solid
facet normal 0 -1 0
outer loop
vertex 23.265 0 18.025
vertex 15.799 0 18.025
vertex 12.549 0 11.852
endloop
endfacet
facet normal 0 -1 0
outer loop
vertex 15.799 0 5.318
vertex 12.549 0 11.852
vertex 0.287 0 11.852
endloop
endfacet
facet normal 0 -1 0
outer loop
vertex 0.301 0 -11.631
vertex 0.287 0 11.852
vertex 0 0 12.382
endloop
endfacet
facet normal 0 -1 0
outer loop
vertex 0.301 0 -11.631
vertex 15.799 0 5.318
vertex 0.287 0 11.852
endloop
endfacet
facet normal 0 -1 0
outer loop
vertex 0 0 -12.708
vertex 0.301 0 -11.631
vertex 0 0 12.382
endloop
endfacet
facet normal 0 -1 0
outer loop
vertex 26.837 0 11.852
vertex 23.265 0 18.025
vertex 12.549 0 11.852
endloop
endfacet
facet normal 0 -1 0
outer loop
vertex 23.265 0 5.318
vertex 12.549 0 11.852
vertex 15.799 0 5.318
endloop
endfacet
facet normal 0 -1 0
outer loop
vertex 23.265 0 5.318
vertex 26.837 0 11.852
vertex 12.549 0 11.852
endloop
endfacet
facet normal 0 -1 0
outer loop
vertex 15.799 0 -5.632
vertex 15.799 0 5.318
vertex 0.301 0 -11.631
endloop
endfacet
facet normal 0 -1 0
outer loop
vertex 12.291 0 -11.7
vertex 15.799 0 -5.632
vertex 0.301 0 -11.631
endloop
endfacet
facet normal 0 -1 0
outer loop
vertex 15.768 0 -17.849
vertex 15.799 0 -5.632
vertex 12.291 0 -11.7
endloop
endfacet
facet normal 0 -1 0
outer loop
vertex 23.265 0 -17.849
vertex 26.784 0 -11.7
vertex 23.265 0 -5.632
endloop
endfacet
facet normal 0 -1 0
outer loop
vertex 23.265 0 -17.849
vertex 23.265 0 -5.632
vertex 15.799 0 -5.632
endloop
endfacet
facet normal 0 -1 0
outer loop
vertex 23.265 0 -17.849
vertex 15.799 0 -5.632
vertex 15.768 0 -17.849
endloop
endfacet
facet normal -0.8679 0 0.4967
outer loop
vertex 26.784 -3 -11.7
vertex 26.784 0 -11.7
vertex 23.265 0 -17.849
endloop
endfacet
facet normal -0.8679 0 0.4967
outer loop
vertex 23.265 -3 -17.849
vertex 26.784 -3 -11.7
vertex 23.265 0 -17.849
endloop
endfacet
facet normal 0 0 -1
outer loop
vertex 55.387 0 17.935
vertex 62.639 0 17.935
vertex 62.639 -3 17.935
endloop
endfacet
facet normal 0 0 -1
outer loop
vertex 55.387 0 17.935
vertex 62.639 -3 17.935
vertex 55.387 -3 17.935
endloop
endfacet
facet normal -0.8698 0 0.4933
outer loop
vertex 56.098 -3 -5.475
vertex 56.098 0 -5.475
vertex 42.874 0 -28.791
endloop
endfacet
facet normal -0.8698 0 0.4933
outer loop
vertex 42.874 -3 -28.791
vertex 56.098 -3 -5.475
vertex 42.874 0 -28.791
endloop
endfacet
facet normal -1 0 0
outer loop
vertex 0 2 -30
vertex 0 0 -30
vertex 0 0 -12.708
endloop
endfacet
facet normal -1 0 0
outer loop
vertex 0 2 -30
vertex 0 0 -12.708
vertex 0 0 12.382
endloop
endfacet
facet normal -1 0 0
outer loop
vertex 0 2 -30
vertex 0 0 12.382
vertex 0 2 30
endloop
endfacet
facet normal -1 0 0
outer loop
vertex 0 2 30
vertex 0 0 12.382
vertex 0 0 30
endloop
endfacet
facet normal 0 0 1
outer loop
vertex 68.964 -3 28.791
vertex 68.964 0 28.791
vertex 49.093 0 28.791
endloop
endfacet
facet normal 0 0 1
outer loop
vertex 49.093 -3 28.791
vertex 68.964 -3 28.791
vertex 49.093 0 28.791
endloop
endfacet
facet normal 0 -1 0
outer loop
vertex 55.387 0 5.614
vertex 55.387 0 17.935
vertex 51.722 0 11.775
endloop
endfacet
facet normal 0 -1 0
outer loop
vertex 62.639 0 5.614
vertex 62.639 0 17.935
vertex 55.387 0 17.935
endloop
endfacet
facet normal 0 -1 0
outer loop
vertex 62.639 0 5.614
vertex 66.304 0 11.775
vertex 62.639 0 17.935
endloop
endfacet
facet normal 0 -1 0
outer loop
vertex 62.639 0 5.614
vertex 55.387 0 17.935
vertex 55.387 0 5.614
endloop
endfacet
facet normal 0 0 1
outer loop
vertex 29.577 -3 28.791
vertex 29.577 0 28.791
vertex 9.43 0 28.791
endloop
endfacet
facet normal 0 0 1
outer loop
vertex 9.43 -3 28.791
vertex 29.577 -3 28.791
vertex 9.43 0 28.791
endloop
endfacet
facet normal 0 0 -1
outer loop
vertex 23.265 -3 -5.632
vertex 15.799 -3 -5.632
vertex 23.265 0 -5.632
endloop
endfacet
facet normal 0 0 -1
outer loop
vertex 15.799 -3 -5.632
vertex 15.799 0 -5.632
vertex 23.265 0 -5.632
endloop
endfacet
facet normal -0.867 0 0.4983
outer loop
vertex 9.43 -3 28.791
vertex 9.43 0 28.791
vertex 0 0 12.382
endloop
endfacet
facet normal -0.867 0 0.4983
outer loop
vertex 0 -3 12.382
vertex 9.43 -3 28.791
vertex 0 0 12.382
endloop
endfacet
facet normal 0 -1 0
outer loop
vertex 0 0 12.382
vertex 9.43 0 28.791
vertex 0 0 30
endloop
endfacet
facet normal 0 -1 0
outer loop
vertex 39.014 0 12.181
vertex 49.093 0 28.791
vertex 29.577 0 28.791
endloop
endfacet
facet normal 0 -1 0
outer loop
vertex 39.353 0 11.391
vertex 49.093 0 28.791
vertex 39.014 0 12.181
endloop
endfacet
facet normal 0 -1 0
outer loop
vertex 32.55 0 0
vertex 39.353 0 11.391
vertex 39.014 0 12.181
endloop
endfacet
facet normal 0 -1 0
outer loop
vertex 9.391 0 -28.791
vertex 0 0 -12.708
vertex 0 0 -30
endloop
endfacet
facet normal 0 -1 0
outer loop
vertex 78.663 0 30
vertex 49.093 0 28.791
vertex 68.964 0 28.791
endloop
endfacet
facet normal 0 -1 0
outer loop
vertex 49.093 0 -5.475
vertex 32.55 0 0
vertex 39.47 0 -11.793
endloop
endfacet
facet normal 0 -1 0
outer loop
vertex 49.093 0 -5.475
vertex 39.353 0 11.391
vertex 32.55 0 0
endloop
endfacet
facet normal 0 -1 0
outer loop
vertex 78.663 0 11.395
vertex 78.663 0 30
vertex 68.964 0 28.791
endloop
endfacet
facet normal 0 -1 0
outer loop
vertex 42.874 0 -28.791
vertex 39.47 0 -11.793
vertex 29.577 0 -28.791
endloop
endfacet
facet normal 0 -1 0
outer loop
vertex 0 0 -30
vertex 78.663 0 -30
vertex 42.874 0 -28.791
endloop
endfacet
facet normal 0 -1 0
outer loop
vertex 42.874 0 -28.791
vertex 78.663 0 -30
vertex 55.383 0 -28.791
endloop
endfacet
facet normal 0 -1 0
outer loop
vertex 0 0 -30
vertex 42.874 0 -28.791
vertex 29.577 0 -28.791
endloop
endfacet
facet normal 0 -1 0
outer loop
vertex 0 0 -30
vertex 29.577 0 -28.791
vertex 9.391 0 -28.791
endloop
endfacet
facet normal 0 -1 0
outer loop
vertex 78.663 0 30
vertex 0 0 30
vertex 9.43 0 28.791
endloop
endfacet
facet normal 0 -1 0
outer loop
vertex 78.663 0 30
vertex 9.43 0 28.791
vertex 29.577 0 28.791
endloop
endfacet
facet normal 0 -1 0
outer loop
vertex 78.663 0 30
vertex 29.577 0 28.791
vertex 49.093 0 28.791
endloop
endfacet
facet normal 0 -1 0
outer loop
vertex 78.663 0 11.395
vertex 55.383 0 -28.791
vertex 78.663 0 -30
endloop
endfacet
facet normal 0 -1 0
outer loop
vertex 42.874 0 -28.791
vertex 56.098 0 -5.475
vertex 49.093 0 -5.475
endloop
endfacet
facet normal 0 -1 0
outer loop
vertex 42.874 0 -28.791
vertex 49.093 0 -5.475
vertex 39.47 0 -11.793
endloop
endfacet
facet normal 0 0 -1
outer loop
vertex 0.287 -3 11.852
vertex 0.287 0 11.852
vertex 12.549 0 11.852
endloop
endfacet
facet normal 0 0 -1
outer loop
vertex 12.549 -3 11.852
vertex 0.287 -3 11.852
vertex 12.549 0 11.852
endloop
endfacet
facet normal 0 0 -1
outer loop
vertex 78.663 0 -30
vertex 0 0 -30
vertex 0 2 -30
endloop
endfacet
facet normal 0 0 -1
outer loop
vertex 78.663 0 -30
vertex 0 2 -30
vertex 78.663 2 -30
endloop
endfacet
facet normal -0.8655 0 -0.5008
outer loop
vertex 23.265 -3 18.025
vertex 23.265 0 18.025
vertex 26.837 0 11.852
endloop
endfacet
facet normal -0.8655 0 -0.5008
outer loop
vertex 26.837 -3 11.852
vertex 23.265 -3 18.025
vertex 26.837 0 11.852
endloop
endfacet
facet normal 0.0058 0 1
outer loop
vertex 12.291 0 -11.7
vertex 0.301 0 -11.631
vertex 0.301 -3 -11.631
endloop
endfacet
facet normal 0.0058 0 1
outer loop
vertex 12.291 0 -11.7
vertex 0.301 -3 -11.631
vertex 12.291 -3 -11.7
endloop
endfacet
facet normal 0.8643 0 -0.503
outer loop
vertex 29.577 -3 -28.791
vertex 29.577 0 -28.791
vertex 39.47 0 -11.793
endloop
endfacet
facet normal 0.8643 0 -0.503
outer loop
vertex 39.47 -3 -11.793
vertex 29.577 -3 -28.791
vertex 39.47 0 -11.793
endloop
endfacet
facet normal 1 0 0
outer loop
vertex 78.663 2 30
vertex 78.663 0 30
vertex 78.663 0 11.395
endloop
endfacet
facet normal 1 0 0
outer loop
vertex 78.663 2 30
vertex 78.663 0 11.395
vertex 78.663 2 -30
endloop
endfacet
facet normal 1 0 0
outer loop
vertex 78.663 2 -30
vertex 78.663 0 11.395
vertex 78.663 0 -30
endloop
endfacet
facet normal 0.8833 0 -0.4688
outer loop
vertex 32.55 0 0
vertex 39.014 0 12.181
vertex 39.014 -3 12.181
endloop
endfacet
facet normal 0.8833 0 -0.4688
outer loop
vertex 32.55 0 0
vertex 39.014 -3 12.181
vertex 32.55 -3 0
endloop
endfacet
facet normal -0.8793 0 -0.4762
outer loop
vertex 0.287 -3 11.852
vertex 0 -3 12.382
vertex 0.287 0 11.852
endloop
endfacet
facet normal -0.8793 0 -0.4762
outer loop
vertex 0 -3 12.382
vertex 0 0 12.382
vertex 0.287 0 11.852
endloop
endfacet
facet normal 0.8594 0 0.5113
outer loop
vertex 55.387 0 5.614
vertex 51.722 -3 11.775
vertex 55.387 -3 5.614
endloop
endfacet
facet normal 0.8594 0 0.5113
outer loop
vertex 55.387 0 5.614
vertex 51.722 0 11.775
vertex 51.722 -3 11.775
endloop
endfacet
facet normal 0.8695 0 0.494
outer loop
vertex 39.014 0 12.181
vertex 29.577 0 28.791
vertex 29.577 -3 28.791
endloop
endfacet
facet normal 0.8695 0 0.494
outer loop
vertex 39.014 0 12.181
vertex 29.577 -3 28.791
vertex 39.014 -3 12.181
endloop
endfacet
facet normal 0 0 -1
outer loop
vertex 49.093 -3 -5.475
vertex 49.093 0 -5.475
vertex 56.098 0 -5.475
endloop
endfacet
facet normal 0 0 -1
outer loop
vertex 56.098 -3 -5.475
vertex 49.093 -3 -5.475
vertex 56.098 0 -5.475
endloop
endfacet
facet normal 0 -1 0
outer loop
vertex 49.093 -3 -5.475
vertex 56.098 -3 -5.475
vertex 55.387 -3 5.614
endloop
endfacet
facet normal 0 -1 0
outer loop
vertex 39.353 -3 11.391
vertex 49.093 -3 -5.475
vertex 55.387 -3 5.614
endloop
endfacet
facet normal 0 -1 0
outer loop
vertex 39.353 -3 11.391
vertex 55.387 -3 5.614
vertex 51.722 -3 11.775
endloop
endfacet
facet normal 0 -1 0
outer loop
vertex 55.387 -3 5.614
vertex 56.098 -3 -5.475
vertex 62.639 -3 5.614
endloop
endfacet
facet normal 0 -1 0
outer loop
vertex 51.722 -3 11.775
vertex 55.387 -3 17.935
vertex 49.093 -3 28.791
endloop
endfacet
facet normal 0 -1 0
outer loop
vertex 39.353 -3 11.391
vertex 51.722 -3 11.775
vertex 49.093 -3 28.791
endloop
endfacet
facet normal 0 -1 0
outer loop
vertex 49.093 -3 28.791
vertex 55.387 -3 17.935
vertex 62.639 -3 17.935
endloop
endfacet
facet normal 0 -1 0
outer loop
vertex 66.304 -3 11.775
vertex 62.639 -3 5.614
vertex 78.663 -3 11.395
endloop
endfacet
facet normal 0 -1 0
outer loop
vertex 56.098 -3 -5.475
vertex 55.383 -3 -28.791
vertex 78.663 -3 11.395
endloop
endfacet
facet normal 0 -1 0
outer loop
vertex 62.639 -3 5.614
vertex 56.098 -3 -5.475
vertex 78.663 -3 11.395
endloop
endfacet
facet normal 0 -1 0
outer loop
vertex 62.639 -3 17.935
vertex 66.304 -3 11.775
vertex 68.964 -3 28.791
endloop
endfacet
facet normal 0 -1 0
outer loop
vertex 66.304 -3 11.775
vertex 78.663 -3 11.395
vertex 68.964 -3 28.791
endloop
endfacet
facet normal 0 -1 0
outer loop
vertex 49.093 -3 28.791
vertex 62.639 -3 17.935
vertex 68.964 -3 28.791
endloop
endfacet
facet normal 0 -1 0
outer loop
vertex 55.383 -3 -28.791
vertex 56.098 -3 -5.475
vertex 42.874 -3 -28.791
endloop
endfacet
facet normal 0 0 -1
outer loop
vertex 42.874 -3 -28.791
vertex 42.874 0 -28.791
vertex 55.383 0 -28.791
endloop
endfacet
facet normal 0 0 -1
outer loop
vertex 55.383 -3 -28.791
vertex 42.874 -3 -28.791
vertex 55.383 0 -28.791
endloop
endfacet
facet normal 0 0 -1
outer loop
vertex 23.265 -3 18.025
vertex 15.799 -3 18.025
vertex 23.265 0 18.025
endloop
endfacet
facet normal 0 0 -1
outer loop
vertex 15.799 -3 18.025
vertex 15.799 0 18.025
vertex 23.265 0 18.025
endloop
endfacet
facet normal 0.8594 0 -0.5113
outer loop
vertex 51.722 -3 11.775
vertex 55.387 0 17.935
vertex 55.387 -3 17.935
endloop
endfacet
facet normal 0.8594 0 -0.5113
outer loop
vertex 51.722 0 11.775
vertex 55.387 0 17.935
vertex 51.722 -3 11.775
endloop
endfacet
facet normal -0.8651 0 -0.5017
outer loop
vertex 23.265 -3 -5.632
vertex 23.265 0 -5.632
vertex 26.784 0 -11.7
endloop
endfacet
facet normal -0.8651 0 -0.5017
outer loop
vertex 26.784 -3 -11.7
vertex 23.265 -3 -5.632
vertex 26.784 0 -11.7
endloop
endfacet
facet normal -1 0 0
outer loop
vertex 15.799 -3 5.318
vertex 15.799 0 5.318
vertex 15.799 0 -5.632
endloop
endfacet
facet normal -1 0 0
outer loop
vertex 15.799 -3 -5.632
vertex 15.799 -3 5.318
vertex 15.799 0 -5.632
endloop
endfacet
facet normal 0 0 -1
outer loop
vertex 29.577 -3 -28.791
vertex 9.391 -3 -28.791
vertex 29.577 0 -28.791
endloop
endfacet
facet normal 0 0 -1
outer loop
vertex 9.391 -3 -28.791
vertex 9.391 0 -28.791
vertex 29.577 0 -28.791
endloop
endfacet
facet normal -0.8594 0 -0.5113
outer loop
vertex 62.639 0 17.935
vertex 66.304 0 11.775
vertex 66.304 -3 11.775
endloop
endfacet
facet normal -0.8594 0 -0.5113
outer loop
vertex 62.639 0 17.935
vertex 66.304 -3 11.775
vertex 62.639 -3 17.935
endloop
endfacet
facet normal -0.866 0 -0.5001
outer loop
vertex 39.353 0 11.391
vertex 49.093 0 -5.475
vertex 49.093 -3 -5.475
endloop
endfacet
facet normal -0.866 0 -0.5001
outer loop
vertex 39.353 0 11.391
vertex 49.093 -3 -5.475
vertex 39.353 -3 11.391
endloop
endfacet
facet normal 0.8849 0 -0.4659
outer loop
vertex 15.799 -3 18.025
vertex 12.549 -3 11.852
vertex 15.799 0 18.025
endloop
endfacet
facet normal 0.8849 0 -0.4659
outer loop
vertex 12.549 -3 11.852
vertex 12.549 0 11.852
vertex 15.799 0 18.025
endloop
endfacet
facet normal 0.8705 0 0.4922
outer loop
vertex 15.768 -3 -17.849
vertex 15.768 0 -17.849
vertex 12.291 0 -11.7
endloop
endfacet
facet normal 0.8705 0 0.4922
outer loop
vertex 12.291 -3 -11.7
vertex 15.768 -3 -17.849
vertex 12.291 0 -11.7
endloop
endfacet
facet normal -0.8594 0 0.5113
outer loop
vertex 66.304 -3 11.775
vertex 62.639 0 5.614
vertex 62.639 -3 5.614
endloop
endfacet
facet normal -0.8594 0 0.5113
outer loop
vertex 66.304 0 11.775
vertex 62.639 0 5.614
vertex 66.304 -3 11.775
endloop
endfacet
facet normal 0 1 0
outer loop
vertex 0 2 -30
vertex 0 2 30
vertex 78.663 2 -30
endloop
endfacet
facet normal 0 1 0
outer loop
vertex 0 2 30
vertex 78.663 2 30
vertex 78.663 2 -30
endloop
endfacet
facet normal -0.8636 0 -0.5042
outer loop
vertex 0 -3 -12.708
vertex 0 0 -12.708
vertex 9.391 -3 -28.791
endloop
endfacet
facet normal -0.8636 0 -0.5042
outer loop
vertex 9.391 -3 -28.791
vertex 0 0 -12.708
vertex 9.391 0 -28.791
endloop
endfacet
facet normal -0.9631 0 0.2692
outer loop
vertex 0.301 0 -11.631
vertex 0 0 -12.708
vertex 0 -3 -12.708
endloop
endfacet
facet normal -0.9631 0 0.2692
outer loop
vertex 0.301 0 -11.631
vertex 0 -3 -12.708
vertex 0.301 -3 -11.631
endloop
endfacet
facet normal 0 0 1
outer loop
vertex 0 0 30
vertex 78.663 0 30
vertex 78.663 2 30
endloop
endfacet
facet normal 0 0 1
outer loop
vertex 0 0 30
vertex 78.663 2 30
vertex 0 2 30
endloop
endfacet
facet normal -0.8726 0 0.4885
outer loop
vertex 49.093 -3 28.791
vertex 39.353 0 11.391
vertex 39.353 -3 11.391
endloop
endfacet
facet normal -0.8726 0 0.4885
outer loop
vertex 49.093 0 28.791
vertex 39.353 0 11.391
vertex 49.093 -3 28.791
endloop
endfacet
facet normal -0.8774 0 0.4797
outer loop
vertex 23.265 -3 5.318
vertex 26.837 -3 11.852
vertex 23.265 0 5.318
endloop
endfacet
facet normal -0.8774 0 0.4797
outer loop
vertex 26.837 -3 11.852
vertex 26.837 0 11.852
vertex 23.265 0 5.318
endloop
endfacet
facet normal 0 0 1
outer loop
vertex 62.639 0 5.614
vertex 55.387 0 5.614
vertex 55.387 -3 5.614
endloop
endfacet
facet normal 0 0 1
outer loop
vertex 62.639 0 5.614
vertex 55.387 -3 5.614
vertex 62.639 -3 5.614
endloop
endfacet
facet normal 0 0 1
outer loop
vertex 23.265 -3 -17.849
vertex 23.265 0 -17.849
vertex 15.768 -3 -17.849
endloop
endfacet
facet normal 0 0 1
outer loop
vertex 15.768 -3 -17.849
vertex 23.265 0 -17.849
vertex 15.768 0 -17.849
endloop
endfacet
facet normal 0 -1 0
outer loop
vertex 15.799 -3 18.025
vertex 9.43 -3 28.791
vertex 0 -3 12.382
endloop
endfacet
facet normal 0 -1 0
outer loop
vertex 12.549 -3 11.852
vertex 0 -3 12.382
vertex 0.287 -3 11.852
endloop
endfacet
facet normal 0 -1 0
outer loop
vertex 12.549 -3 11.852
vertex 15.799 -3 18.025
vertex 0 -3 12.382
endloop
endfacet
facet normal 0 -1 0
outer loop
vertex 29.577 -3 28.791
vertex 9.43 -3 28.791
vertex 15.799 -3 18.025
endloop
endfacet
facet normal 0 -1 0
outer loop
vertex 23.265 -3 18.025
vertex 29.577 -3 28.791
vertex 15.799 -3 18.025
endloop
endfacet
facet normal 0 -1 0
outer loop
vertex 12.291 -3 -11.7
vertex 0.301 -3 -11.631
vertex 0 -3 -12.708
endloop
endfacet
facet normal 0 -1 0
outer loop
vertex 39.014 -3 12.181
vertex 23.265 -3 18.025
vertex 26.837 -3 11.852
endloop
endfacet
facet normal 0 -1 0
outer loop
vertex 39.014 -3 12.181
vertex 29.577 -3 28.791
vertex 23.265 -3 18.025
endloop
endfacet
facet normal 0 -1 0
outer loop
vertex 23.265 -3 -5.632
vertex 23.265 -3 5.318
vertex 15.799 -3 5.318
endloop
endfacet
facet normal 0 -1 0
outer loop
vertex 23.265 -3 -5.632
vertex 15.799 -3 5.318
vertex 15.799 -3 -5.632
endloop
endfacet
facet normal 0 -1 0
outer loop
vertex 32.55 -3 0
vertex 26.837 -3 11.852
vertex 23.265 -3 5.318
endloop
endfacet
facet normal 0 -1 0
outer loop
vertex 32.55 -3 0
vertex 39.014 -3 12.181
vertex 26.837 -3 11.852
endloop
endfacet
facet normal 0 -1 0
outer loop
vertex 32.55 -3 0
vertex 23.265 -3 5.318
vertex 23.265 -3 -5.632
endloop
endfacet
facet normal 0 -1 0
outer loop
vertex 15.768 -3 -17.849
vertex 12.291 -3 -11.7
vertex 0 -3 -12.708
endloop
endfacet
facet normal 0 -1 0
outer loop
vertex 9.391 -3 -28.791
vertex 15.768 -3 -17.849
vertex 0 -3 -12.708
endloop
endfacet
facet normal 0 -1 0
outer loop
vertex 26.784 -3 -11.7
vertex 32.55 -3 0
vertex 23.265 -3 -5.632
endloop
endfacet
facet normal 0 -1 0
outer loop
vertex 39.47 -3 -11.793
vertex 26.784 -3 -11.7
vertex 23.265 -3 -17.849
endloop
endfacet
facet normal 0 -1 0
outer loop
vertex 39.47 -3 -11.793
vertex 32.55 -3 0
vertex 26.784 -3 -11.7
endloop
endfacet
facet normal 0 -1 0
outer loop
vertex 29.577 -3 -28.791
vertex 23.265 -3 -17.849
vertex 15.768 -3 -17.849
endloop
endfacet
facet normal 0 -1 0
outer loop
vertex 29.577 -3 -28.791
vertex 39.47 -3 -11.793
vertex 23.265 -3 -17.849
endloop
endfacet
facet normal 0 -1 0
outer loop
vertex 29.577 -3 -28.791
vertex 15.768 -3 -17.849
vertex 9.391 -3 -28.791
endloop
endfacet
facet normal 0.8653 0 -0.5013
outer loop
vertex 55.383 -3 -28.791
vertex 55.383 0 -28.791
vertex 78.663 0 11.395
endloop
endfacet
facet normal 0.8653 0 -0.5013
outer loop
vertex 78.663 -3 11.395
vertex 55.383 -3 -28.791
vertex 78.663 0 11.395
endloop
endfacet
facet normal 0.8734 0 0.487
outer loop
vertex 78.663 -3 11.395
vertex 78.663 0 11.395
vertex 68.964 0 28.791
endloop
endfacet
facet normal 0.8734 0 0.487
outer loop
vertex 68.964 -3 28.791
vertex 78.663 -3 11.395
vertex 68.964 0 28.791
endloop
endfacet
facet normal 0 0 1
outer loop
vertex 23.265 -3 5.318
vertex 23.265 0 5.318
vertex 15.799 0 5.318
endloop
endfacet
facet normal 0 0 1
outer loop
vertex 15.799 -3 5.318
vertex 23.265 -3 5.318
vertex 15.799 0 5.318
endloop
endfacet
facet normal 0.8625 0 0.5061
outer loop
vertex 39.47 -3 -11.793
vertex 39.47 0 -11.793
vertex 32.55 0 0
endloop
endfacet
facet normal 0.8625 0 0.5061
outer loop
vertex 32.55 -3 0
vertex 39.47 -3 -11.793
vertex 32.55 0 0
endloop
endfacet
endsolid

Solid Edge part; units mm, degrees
sketch "Sketch1" plane through (0, 0, 0) normal (0, -1, 0) x (1, 0, 0)
  line L0 (-100, -30) -> (100, -30)
  line L1 (100, -30) -> (100, 30)
  line L2 (100, 30) -> (-100, 30)
  line L3 (-100, 30) -> (-100, -30)
  dimension "D1" = 200
  dimension "D2" = 60
extrude "Protrusion1" add sketch "Sketch1" against normal blind 2
sketch "Sketch2" plane through (0, 0, 0) normal (0, -1, 0) x (1, 0, 0)
  line L0 (-39.6222, 11.5432) -> (-48.7647, 28.7907)
  line L1 (-48.7647, 28.7907) -> (-68.9181, 28.7907)
  line L2 (-68.9181, 28.7907) -> (-78.6631, 12.1124)
  line L3 (-78.6631, 12.1124) -> (-65.8971, 12.1124)
  line L4 (-65.8971, 12.1124) -> (-62.8688, 18.0634)
  line L5 (-62.8688, 18.0634) -> (-55.6447, 18.0634)
  line L6 (-55.6447, 18.0634) -> (-51.8394, 12.1124)
  line L7 (-51.8394, 12.1124) -> (-55.6447, 5.4911)
  line L8 (-55.6447, 5.4911) -> (-62.8688, 5.4911)
  line L9 (-62.8688, 5.4911) -> (-62.8688, -5.6236)
  line L10 (-62.8688, -5.6236) -> (-55.2147, -5.6236)
  line L11 (-55.2147, -5.6236) -> (-51.8394, -11.6625)
  line L12 (-51.8394, -11.6625) -> (-55.2147, -18.0171)
  line L13 (-55.2147, -18.0171) -> (-62.8688, -18.0171)
  line L14 (-62.8688, -18.0171) -> (-65.8971, -11.6625)
  line L15 (-65.8971, -11.6625) -> (-78.6631, -11.6625)
  line L16 (-78.6631, -11.6625) -> (-68.9922, -28.7907)
  line L17 (-48.7647, -28.7907) -> (-68.9922, -28.7907)
  line L18 (-48.7647, -28.7907) -> (-39.6222, -12.3974)
  line L19 (-39.6222, -12.3974) -> (-45.6448, 0)
  line L20 (-45.6448, 0) -> (-39.6222, 11.5432)
  line L21 (-29.8239, 28.7907) -> (-39.0136, 11.3404)
  line L22 (-39.0136, 11.3404) -> (-27.2051, 11.3404)
  line L23 (-27.2051, 11.3404) -> (-23.5794, 17.7709)
  line L24 (-23.5794, 17.7709) -> (-16.2069, 17.7709)
  line L25 (-16.2069, 17.7709) -> (-12.7725, 11.3404)
  line L26 (-12.7725, 11.3404) -> (-16.2069, 5.3584)
  line L27 (-16.2069, 5.3584) -> (-23.5794, 5.3584)
  line L28 (-23.5794, 5.3584) -> (-23.5794, -5.3744)
  line L29 (-23.5794, -5.3744) -> (-16.2069, -5.3744)
  line L30 (-16.2069, -5.3744) -> (-12.7725, -11.9215)
  line L31 (-12.7725, -11.9215) -> (-16.2069, -18.0364)
  line L32 (-16.2069, -18.0364) -> (-23.5794, -18.0364)
  line L33 (-23.5794, -18.0364) -> (-27.2051, -11.9215)
  line L34 (-27.2051, -11.9215) -> (-39.0832, -11.9215)
  line L35 (-39.0832, -11.9215) -> (-39.0211, -12.3974)
  line L36 (-39.0211, -12.3974) -> (-29.8416, -28.7907)
  line L37 (-29.8416, -28.7907) -> (-9.9734, -28.7907)
  line L38 (-9.9734, -28.7907) -> (0, -11.7929)
  line L39 (0, -11.7929) -> (-6.8407, 0)
  line L40 (-6.8407, 0) -> (0, 11.8515)
  line L41 (0, 11.8515) -> (-9.9734, 28.7907)
  line L42 (-9.9734, 28.7907) -> (-29.8239, 28.7907)
  line L43 (9.4303, 28.7907) -> (0, 12.3815)
  line L44 (0, 12.3815) -> (0.2872, 11.8515)
  line L45 (0.2872, 11.8515) -> (12.5492, 11.8515)
  line L46 (12.5492, 11.8515) -> (15.7991, 18.0247)
  line L47 (15.7991, 18.0247) -> (23.265, 18.0247)
  line L48 (23.265, 18.0247) -> (26.8369, 11.8515)
  line L49 (26.8369, 11.8515) -> (23.265, 5.318)
  line L50 (23.265, 5.318) -> (15.7991, 5.318)
  line L51 (15.7991, 5.318) -> (15.7991, -5.632)
  line L52 (15.7991, -5.632) -> (23.265, -5.632)
  line L53 (23.265, -5.632) -> (26.7839, -11.7003)
  line L54 (26.7839, -11.7003) -> (23.265, -17.8487)
  line L55 (23.265, -17.8487) -> (15.768, -17.8487)
  line L56 (15.768, -17.8487) -> (12.2913, -11.7003)
  line L57 (0.3007, -11.6312) -> (12.2913, -11.7003)
  line L58 (0, -12.7084) -> (0.3007, -11.6312)
  line L59 (0, -12.7084) -> (9.391, -28.7907)
  line L60 (9.391, -28.7907) -> (29.5768, -28.7907)
  line L61 (29.5768, -28.7907) -> (39.4696, -11.7929)
  line L62 (39.4696, -11.7929) -> (32.5504, 0)
  line L63 (39.014, 12.1809) -> (32.5504, 0)
  line L64 (29.5768, 28.7907) -> (39.014, 12.1809)
  line L65 (29.5768, 28.7907) -> (9.4303, 28.7907)
  line L66 (39.3531, 11.3913) -> (49.0927, 28.7907)
  line L67 (68.964, 28.7907) -> (49.0927, 28.7907)
  line L68 (78.6631, 11.3946) -> (68.964, 28.7907)
  line L69 (55.3829, -28.7907) -> (78.6631, 11.3946)
  line L70 (42.8739, -28.7907) -> (55.3829, -28.7907)
  line L71 (56.0977, -5.4746) -> (42.8739, -28.7907)
  line L72 (49.0927, -5.4746) -> (56.0977, -5.4746)
  line L73 (49.0927, -5.4746) -> (39.3531, 11.3913)
  line L74 (51.7218, 11.7746) -> (55.3868, 5.6144)
  line L75 (55.3868, 5.6144) -> (62.6387, 5.6144)
  line L76 (62.6387, 5.6144) -> (66.3037, 11.7746)
  line L77 (66.3037, 11.7746) -> (62.6387, 17.9349)
  line L78 (62.6387, 17.9349) -> (55.3868, 17.9349)
  line L79 (55.3868, 17.9349) -> (51.7218, 11.7746)
extrude "ExtrudedProtrusion_3" add sketch "Sketch2" along normal blind 3
sketch "Sketch3" plane through (0, 0, 0) normal (0, -1, 0) x (1, 0, 0)
  line L0 (-100, -30) -> (0, -30)
  line L1 (0, -30) -> (0, 30)
  line L2 (0, 30) -> (-100, 30)
  line L3 (-100, 30) -> (-100, -30)
  line L4 (100, -30) -> (100, 30)
  line L5 (100, 30) -> (78.6631, 30)
  line L6 (78.6631, 30) -> (78.6631, -30)
  line L7 (78.6631, -30) -> (100, -30)
extrude "ExtrudedCutout_1" cut sketch "Sketch3" along normal blind 52.8721
sketch "Sketch4" plane through (0, 0, 0) normal (0, -1, 0) x (1, 0, 0)
  line L0 (-100, 30) -> (-100, -30)
  line L1 (-100, -30) -> (0, -30)
  line L2 (0, -30) -> (0, 30)
  line L3 (0, 30) -> (-100, 30)
  line L4 (100, -30) -> (100, 30)
  line L5 (100, 30) -> (78.6631, 30)
  line L6 (78.6631, 30) -> (78.6631, -30)
  line L7 (78.6631, -30) -> (100, -30)
extrude "ExtrudedCutout_2" cut sketch "Sketch4" against normal blind 13.1606
properties part number "BumbleB0910"
